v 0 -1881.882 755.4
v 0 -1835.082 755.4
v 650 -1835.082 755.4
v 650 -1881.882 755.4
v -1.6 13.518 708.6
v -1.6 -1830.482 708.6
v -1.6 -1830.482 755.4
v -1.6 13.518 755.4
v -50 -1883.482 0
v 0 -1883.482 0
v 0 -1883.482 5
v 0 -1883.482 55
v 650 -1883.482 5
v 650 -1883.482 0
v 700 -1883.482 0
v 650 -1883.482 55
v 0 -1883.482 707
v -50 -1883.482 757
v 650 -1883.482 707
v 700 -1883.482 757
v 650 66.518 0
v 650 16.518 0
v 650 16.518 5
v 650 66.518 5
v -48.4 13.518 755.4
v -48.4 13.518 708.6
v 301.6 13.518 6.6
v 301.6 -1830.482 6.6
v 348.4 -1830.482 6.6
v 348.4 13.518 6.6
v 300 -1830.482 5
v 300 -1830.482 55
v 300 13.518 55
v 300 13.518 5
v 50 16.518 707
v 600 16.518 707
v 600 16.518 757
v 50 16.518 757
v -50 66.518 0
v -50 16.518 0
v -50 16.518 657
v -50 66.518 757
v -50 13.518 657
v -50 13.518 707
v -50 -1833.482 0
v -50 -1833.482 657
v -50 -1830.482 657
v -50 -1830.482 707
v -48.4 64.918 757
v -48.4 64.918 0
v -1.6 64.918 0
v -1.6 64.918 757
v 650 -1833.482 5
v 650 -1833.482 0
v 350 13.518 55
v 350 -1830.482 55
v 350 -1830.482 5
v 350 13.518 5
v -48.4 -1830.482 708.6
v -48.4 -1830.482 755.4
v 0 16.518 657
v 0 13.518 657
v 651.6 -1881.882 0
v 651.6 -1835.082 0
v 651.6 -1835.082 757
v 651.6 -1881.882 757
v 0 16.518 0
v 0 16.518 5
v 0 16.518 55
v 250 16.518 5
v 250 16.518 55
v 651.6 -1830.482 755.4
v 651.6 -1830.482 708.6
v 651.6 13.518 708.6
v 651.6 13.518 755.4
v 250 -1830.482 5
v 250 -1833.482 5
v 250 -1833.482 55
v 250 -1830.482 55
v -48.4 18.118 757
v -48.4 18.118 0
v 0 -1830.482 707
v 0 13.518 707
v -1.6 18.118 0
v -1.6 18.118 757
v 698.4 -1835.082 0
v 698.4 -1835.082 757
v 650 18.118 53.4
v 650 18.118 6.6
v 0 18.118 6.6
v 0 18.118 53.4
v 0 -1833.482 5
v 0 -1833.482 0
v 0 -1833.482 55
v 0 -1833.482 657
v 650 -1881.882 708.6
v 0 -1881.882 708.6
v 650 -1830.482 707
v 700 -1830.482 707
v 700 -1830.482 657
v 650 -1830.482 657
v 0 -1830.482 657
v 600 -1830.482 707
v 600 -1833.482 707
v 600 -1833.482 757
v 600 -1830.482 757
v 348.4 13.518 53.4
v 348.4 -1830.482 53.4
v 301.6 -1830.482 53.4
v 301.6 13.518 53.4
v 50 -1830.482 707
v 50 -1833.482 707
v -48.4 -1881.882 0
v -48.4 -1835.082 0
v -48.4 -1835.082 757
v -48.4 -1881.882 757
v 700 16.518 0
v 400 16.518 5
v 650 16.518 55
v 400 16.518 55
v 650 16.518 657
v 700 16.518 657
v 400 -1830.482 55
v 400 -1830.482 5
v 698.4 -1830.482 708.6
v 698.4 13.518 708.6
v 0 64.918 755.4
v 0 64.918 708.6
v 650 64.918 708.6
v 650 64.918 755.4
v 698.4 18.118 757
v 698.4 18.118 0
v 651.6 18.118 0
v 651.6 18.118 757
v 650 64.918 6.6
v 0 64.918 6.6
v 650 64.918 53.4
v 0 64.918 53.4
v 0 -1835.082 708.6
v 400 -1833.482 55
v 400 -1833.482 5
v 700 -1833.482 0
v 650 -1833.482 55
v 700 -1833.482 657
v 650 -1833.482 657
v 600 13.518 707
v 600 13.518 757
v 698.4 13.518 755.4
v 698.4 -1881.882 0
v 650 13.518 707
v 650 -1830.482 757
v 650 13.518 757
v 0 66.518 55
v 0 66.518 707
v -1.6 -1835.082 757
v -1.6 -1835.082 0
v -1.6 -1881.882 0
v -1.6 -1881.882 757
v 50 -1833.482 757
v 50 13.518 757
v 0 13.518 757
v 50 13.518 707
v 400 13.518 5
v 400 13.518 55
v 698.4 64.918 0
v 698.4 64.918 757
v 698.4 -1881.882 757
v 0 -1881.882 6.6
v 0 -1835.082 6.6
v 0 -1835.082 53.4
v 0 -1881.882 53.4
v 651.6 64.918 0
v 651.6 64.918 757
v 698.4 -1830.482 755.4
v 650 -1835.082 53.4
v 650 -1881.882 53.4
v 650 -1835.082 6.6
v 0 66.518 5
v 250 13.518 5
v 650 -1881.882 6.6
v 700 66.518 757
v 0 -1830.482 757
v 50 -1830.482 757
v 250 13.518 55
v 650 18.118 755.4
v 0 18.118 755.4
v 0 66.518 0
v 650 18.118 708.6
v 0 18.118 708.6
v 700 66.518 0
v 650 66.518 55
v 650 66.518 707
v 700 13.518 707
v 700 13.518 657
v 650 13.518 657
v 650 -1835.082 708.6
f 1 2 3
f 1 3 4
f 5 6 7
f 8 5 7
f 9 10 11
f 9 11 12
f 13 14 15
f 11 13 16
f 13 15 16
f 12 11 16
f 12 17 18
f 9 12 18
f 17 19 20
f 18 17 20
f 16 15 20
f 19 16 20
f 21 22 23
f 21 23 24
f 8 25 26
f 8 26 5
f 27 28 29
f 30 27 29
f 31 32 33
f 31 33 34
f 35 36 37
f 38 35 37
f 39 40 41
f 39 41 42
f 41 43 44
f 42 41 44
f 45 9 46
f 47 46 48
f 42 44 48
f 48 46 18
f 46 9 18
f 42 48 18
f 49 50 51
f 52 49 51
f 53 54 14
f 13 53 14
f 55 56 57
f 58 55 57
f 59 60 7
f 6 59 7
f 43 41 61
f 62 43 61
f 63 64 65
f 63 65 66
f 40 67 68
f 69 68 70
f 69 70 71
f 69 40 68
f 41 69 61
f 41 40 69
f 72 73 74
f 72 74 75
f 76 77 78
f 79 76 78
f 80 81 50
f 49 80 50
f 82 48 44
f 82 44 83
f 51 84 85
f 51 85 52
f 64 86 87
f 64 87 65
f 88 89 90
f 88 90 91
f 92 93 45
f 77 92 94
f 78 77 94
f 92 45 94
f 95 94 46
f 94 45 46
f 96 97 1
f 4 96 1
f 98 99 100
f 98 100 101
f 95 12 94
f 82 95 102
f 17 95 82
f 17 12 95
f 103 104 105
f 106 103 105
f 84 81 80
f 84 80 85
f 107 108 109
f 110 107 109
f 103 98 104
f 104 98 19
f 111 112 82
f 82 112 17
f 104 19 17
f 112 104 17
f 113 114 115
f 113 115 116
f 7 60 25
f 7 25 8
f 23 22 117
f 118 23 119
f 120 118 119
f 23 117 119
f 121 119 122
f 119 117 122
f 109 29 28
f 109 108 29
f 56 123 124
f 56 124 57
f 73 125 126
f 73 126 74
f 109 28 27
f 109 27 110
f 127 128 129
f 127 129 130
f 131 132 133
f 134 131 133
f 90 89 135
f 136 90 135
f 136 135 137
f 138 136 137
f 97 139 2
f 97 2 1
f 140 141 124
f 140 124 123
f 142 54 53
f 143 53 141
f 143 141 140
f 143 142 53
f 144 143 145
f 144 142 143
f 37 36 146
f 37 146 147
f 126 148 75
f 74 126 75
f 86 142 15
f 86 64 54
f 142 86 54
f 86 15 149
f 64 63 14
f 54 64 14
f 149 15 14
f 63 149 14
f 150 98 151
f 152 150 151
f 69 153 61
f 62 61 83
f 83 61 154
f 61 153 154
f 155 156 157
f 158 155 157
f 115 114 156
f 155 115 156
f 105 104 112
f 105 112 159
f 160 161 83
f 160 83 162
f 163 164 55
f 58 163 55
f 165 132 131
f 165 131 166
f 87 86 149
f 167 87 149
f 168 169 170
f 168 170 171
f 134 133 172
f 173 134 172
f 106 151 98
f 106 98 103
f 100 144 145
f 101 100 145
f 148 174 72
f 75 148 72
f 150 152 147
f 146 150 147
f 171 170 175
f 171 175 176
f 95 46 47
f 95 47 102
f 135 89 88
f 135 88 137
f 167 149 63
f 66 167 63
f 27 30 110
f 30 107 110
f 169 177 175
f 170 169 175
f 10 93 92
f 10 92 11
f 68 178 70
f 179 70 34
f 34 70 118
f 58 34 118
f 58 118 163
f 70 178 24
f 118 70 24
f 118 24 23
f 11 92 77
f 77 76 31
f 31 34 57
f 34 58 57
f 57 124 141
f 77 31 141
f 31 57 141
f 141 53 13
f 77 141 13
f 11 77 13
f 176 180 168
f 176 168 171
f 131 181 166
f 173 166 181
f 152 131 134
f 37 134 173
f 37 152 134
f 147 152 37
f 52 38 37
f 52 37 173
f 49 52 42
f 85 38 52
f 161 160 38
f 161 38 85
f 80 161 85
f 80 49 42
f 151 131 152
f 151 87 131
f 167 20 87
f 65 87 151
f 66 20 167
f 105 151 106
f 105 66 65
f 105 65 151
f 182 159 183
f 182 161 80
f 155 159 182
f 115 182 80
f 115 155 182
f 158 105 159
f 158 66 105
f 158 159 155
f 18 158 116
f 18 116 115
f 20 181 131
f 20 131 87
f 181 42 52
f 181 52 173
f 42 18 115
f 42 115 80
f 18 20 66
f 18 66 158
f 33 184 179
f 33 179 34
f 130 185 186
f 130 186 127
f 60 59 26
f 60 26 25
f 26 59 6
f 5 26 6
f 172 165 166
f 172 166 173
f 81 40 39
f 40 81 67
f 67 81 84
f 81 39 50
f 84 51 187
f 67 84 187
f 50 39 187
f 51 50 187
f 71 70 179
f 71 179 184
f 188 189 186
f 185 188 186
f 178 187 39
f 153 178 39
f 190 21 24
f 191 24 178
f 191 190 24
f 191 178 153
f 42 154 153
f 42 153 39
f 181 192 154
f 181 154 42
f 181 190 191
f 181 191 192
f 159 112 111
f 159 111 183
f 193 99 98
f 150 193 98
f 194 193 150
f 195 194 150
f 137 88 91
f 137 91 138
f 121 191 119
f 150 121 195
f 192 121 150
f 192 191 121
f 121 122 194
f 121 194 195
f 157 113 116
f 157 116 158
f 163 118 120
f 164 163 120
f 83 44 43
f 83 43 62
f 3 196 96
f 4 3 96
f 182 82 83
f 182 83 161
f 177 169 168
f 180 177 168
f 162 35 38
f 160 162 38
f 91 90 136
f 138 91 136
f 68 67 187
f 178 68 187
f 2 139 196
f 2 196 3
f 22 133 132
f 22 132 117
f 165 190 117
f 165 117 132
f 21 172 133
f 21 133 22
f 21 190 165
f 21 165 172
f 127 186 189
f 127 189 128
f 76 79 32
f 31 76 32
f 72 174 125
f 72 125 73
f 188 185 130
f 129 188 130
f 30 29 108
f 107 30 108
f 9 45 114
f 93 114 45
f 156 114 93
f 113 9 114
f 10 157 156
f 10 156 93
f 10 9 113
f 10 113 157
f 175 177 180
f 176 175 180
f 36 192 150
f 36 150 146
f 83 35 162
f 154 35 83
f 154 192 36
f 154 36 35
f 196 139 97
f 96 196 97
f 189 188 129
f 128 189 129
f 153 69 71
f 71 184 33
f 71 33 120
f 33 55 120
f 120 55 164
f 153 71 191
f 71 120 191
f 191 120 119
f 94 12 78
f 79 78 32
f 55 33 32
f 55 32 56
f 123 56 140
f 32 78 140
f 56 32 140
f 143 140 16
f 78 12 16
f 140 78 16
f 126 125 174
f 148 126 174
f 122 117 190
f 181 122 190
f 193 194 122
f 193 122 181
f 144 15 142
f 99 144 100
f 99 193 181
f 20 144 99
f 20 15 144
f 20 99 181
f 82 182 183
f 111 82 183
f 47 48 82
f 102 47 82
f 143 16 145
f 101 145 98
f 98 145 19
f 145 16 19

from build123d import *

# Parameters (mm, degrees)
F0_W     = 50
F0_H     = 50
F0_W_2   = 46.8
F0_H_2   = 46.8
F1_DEPTH = 757
F2_W     = 50
F2_H     = 50
F2_W_2   = 46.8
F2_H_2   = 46.8
F3_DEPTH = 325
F4_W     = 75
F4_H     = 50
F5_DEPTH = 3
F6_W     = 50
F6_H     = 50
F6_W_2   = 46.8
F6_H_2   = 46.8
F7_DEPTH = 922
F9_DEPTH = 922


with BuildPart() as f1:
    # F0 (on Top) → F1 (new body)
    with BuildSketch(Plane.XY):
        with Locations((-25, 41.517847)):
            Rectangle(F0_W, F0_H)
        with Locations((-25, 41.517847)):
            Rectangle(F0_W_2, F0_H_2, mode=Mode.SUBTRACT)
    extrude(amount=F1_DEPTH)

    # F2 (on face) → F3 (join)
    with BuildSketch(Plane.YZ):
        with Locations((41.517847, 732)):
            Rectangle(F2_W, F2_H)
        with Locations((41.517847, 732)):
            Rectangle(F2_W_2, F2_H_2, mode=Mode.SUBTRACT)
        with Locations((41.517847, 30)):
            Rectangle(F2_W, F2_H)
        with Locations((41.517847, 30)):
            Rectangle(F2_W_2, F2_H_2, mode=Mode.SUBTRACT)
    extrude(amount=F3_DEPTH)

    # F4 (on face) → F5 (join)
    with BuildSketch(Plane.XZ.offset(-16.517847)):
        Polygon((50, 757), (-50, 757), (-50, 657), (0, 657), (0, 707), (50, 707), align=None)
        with Locations((287.5, 30)):
            Rectangle(F4_W, F4_H)
    extrude(amount=F5_DEPTH)

    # F6 (on face) → F7 (join)
    with BuildSketch(Plane.XZ.offset(-13.517847)):
        with Locations((-25, 732)):
            Rectangle(F6_W, F6_H)
        with Locations((-25, 732)):
            Rectangle(F6_W_2, F6_H_2, mode=Mode.SUBTRACT)
    extrude(amount=F7_DEPTH)

    # F8 (on face) → F9 (join)
    with BuildSketch(Plane.XZ.offset(-13.517847)):
        Polygon((325, 53.4), (325, 55), (300, 55), (300, 5), (325, 5), (325, 6.6), (301.6, 6.6), (301.6, 53.4), align=None)
    extrude(amount=F9_DEPTH)

    # F10: F1 across face


with BuildPart() as f1_1:
    add(f1.part)
    add(f1.part.mirror(Plane(origin=(325, -382.720488, 30), x_dir=(0, 1, 0), z_dir=(1, 0, 0))))

    # F11: F1 across face


with BuildPart() as f1_2:
    add(f1_1.part)
    add(f1_1.part.mirror(Plane(origin=(325, -908.482153, 30), x_dir=(1, 0, 0), z_dir=(0, -1, 0))))


solid = f1_2.part
